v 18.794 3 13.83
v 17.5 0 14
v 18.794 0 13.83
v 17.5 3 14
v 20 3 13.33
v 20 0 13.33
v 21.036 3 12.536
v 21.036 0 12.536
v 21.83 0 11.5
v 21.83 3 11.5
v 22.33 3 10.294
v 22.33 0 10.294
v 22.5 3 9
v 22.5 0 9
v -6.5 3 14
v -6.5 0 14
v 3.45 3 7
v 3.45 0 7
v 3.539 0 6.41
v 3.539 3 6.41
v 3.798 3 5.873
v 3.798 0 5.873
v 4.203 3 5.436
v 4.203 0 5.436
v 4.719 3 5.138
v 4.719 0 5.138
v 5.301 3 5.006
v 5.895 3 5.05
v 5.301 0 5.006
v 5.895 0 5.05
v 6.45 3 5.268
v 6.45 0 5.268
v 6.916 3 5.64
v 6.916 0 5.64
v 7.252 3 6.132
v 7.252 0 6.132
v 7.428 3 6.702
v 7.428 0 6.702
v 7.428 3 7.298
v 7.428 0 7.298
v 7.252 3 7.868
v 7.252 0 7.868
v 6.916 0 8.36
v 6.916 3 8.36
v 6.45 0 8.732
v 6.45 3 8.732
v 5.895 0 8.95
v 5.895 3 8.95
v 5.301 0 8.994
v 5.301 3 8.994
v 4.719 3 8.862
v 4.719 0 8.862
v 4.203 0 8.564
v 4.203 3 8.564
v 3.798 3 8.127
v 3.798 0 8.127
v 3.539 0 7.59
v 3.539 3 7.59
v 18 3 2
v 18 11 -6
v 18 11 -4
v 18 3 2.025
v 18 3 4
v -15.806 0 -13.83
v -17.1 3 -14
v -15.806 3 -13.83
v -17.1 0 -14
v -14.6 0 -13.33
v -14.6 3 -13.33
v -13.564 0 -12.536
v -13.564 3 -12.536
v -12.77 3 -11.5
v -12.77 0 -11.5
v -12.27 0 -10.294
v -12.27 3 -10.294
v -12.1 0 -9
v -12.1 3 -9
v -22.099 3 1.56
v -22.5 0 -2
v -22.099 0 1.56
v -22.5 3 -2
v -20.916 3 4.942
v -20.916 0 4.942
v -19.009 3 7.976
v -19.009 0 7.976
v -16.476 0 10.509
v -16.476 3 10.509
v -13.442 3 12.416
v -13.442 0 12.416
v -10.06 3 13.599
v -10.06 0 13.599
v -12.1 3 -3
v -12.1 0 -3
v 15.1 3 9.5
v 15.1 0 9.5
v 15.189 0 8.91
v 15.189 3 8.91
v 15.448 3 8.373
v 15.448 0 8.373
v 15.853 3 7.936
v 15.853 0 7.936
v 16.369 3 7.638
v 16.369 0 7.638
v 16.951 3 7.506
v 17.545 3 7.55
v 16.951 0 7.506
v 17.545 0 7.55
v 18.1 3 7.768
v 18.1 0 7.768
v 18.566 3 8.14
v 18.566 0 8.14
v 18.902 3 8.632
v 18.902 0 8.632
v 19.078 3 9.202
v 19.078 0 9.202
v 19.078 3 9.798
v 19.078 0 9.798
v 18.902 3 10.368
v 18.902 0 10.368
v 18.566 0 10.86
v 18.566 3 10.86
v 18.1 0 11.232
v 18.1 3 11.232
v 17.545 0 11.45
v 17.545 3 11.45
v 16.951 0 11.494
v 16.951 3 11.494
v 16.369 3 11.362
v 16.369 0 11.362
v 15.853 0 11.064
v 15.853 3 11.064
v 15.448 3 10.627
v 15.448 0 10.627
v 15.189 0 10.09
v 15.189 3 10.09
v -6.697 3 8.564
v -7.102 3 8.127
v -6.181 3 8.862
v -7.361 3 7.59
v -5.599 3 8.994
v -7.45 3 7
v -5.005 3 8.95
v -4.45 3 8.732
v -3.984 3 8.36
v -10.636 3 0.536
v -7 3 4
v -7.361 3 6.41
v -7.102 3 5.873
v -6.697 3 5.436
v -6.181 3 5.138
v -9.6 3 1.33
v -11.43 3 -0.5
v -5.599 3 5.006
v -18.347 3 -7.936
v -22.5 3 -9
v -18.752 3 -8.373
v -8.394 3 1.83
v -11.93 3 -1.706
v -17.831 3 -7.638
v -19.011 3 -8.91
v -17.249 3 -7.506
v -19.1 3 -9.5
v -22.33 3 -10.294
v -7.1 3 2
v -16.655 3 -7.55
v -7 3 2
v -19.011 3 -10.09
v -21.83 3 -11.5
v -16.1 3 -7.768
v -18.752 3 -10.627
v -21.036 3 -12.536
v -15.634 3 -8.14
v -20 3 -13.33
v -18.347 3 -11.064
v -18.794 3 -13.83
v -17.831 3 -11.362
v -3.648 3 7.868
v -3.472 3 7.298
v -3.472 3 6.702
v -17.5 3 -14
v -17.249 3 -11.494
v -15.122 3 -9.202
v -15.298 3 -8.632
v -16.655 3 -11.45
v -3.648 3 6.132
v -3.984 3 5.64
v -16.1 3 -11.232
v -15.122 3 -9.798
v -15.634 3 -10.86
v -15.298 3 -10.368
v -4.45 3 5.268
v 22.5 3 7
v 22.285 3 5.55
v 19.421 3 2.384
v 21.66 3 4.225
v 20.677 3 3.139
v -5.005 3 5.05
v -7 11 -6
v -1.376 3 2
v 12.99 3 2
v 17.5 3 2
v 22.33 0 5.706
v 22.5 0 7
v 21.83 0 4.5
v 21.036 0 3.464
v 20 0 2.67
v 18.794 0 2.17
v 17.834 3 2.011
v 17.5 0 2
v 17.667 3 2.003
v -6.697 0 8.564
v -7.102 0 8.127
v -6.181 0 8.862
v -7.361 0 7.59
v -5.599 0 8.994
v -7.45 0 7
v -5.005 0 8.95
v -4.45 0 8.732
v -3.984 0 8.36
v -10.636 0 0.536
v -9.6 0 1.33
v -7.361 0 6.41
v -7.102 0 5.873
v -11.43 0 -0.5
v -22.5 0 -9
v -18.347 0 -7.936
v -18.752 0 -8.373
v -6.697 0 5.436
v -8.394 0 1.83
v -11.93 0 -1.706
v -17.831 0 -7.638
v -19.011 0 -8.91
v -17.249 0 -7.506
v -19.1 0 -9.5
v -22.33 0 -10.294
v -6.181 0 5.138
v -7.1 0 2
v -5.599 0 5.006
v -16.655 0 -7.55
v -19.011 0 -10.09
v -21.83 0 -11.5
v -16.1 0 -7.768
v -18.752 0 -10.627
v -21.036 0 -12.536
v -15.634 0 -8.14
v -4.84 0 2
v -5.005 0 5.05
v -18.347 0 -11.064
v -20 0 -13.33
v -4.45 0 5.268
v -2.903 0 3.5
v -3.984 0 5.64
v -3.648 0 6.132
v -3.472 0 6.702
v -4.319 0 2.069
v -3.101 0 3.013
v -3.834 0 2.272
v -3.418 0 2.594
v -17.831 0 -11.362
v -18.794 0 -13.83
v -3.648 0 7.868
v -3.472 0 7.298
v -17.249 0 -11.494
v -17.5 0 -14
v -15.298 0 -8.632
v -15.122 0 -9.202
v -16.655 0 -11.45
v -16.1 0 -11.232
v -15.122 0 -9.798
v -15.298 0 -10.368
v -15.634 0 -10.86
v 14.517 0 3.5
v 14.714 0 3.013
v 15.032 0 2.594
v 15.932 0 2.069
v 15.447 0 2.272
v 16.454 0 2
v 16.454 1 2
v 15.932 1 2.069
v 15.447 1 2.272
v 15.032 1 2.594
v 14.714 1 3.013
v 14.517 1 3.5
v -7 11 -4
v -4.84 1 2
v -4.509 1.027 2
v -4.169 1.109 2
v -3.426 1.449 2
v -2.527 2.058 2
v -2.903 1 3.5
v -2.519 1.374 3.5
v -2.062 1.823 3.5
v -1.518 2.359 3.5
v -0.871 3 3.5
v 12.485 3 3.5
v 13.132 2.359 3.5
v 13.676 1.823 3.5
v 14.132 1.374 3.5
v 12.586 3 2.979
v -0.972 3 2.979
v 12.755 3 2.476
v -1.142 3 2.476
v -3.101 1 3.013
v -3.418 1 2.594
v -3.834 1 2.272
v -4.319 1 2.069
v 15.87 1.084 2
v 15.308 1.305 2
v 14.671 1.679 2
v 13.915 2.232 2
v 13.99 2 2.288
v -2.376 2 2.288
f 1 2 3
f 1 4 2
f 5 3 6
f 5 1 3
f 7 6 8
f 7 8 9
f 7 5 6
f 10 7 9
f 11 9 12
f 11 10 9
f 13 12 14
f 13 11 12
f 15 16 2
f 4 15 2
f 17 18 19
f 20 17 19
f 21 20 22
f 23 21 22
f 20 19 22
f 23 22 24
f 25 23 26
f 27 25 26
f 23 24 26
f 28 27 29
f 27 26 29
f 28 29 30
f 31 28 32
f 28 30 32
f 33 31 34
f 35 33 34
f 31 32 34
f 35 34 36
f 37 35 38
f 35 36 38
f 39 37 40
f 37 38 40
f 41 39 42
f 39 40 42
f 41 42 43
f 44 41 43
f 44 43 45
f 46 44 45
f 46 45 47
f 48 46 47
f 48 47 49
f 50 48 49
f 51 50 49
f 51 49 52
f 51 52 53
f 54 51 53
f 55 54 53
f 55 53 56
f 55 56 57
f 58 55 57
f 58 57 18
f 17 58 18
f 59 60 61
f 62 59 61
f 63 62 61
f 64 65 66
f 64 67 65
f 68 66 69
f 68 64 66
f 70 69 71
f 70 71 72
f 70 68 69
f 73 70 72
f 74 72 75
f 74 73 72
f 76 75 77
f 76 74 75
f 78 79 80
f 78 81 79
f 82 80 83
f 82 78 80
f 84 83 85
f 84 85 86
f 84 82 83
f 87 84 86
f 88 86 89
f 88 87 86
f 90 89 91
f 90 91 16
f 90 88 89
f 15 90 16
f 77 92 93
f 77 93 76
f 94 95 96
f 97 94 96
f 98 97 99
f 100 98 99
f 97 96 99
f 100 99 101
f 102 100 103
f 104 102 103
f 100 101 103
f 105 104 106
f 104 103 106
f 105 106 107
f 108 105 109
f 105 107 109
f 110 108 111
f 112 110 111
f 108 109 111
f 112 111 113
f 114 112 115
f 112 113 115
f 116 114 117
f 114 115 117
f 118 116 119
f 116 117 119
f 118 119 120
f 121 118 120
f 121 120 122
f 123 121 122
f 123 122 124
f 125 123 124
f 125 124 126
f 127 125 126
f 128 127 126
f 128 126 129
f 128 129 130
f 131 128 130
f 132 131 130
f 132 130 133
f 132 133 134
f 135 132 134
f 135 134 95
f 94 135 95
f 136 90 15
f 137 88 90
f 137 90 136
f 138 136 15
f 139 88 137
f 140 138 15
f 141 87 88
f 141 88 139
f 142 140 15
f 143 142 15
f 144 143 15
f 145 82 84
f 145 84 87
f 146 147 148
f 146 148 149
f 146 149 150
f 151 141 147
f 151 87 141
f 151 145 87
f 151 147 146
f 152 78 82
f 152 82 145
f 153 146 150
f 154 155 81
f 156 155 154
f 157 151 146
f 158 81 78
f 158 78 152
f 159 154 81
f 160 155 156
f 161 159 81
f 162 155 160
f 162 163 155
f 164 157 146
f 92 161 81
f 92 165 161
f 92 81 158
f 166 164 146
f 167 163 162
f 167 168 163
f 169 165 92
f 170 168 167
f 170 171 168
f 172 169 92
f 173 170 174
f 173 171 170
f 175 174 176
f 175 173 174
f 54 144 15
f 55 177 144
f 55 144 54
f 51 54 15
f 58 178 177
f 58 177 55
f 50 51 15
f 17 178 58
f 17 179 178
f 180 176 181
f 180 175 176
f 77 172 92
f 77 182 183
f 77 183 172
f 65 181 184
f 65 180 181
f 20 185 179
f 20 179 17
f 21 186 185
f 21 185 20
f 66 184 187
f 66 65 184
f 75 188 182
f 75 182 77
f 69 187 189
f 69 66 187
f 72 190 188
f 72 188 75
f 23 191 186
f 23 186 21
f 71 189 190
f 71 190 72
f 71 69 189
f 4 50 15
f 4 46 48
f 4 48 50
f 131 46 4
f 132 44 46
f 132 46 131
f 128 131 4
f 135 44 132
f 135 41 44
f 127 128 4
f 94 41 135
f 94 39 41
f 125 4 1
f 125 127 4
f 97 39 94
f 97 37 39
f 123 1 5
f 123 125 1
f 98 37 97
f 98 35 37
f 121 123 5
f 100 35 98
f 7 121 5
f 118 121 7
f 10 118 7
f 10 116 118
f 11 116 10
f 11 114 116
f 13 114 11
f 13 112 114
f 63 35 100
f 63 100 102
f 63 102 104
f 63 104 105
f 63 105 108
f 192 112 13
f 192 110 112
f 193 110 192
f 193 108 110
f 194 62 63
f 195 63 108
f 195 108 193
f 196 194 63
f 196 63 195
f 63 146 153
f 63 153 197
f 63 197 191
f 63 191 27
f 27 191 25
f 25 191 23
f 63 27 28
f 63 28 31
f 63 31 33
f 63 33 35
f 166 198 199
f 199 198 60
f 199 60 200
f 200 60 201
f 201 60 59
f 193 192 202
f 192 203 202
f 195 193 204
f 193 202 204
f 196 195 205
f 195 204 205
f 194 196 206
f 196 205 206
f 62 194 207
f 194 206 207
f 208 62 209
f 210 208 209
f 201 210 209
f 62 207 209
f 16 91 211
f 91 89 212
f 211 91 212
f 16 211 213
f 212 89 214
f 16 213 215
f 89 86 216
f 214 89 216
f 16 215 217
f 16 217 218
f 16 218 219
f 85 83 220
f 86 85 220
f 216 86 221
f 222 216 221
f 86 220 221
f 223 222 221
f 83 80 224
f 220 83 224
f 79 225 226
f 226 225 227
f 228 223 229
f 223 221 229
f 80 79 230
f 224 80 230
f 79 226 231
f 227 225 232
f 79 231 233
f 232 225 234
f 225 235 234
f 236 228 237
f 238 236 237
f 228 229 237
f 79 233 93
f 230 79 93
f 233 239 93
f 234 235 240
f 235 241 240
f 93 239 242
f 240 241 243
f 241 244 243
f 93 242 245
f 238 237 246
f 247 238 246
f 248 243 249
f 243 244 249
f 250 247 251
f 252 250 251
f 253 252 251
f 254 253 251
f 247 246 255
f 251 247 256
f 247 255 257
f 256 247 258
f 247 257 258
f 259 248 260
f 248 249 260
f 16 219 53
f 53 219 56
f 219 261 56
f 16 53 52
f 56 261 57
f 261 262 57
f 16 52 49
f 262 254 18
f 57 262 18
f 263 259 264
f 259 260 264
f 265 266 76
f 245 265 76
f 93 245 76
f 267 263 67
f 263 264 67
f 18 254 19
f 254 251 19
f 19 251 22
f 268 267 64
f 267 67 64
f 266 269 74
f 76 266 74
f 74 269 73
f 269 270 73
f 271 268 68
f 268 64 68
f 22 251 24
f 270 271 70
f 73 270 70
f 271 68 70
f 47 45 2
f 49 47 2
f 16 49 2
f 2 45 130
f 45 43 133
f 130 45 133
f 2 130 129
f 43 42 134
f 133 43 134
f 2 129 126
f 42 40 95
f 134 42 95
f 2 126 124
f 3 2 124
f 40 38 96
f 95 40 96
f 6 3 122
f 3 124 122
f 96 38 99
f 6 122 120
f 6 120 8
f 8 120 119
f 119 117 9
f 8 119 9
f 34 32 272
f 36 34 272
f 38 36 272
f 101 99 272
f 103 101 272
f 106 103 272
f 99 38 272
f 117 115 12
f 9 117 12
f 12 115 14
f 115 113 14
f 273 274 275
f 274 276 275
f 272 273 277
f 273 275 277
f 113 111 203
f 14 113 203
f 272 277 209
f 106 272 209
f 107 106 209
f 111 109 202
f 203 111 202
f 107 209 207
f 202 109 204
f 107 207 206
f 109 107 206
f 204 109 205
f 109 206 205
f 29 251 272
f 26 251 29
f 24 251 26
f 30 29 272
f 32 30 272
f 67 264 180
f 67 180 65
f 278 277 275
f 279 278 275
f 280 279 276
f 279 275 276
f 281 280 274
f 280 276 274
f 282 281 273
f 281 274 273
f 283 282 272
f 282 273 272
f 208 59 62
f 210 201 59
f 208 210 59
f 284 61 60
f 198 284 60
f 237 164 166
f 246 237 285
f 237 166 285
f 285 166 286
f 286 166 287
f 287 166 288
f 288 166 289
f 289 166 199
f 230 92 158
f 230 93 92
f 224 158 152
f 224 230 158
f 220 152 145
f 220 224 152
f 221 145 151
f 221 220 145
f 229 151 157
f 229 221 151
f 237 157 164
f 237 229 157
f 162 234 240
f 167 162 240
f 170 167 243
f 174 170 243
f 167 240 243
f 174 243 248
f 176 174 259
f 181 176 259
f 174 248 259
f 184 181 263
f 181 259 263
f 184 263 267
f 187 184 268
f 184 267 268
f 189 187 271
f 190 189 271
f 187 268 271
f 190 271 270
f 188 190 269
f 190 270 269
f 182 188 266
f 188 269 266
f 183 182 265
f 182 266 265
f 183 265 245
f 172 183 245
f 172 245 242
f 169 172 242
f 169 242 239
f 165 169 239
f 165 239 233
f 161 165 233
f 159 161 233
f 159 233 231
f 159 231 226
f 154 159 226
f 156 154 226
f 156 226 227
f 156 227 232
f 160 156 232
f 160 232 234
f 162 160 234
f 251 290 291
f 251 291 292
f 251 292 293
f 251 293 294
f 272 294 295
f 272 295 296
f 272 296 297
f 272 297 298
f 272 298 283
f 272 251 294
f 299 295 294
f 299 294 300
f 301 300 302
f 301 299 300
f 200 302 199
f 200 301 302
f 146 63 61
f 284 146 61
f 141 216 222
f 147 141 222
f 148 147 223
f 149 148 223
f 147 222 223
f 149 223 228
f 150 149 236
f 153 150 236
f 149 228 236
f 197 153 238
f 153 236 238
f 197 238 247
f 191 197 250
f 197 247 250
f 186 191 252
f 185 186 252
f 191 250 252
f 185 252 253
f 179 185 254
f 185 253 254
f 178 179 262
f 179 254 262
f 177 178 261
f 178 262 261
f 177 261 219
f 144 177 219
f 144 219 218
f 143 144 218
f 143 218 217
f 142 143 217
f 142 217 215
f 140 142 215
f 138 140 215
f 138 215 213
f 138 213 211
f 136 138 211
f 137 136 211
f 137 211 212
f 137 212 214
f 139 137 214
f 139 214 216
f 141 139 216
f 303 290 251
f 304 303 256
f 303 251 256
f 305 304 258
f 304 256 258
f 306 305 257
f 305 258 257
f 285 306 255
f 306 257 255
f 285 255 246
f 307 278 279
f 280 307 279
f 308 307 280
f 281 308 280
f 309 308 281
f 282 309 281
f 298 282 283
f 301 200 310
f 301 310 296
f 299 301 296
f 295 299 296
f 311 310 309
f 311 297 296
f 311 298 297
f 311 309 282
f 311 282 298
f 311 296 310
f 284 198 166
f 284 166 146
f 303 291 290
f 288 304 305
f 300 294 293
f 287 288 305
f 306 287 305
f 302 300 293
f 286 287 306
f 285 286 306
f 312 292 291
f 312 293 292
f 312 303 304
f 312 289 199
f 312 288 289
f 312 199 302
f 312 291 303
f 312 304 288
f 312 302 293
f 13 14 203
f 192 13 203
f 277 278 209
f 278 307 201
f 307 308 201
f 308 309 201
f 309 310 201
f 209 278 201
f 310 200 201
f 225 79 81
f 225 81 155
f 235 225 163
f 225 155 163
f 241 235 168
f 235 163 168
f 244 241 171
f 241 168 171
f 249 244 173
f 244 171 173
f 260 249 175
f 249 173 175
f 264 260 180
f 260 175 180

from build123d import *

# Parameters (mm, degrees)
SKETCH1_W                = 45
SKETCH1_H                = 28
BOSS_EXTRUDE1_DEPTH      = 3
F_4_0_4_DIAMETER_HOLE1_D = 4
F_4_0_4_DIAMETER_HOLE2_D = 4
SKETCH10_W               = 34.6
SKETCH10_H               = 16
CUT_EXTRUDE2_DEPTH       = 3
FILLET2_R                = 5
FILLET3_R                = 16
BOSS_EXTRUDE2_START      = -5
BOSS_EXTRUDE2_DEPTH      = 25
SKETCH12_W               = 17.420537897
SKETCH12_H               = 1.5
CUT_EXTRUDE3_DEPTH       = 3
FILLET4_R                = 2
CHAMFER1_SIZE            = 2


with BuildPart() as part:
    # Sketch1 → Boss-Extrude1 (new body)
    with BuildSketch(Plane(origin=(0, 0, 0), x_dir=(1, 0, 0), z_dir=(0, 1, 0))):
        Rectangle(SKETCH1_W, SKETCH1_H)
    extrude(amount=BOSS_EXTRUDE1_DEPTH)

    # Ø4.0 (4) Diameter Hole1 (through all)
    with Locations(Plane(origin=(0, 3, 0), x_dir=(1, 0, 0), z_dir=(0, 1, 0))):
        with Locations((-17.1, 9.5), (17.1, -9.5)):
            Hole(F_4_0_4_DIAMETER_HOLE1_D / 2)

    # Ø4.0 (4) Diameter Hole2 (through all)
    with Locations(Plane(origin=(0, 3, 0), x_dir=(1, 0, 0), z_dir=(0, 1, 0))):
        with Locations((-5.45, -7), (5.45, -7)):
            Hole(F_4_0_4_DIAMETER_HOLE2_D / 2)

    # Sketch10 → Cut-Extrude2 (cut)
    with BuildSketch(Plane(origin=(0, 3, 0), x_dir=(1, 0, 0), z_dir=(0, 1, 0))):
        with Locations((5.2, 6)):
            Rectangle(SKETCH10_W, SKETCH10_H)
    extrude(amount=-CUT_EXTRUDE2_DEPTH, mode=Mode.SUBTRACT)

    # Fillet2
    fillet2_edges = [part.edges().sort_by_distance(p)[0] for p in [
        (-12.1, 1.5, -14),
        (22.5, 1.5, 2),
        (-12.1, 1.5, 2),
        (-22.5, 1.5, -14),
        (22.5, 1.5, 14),
    ]]
    fillet(fillet2_edges, radius=FILLET2_R)

    # Fillet3
    fillet3_edges = [part.edges().sort_by_distance(p)[0] for p in [
        (-22.5, 1.5, 14),
    ]]
    fillet(fillet3_edges, radius=FILLET3_R)

    # Sketch11 → Boss-Extrude2 (add)
    with BuildSketch(Plane(origin=(23, 0, 0), x_dir=(0, 0, -1), z_dir=(1, 0, 0)).offset(BOSS_EXTRUDE2_START)):
        Polygon((-4, 3), (4, 11), (6, 11), (-2, 3), align=None)
    extrude(amount=-BOSS_EXTRUDE2_DEPTH)

    # Sketch12 → Cut-Extrude3 (cut)
    with BuildSketch(Plane.XZ):
        with Locations((5.806845965, 2.75)):
            Rectangle(SKETCH12_W, SKETCH12_H)
    extrude(amount=-CUT_EXTRUDE3_DEPTH, mode=Mode.SUBTRACT)

    # Fillet4
    # the kernel refuses this fillet: 2 mm, written as the material it takes off along each edge
    with BuildSketch(Plane(origin=(-2.903422983, -4.841229183, 2), x_dir=(0, 0, 1), z_dir=(0, 1, 0))) as fillet4_piece_1:
        with BuildLine():
            CenterArc((2, -1.936491673), FILLET4_R, 104.477512186, 75.522487814)
            Line((0, -1.936491673), (0, 0))
            Line((0, 0), (1.5, 0))
        make_face()
    extrude(amount=7.841229183, mode=Mode.SUBTRACT)
    with BuildSketch(Plane(origin=(14.517114914, -4.841229183, 2), x_dir=(1, 0, 0), z_dir=(0, 1, 0))) as fillet4_piece_2:
        with BuildLine():
            CenterArc((1.936491673, -2), FILLET4_R, 90, 75.522487814)
            Line((0, -1.5), (0, 0))
            Line((0, 0), (1.936491673, 0))
        make_face()
    extrude(amount=7.841229183, mode=Mode.SUBTRACT)

    # Chamfer1
    # the kernel refuses this chamfer: 2 mm, written as the material it adds along each edge
    with BuildSketch(Plane(origin=(-4.839914656, 3, 4), x_dir=(-0.680858233566239, 0, 0.732415227712437), z_dir=(-0.732415227712437, 0, -0.680858233566239))) as chamfer1_piece_1_section:
        Polygon((2, -CHAMFER1_SIZE), (2 + CHAMFER1_SIZE, 0), (2, 0), align=None)
    chamfer1_piece_1 = revolve(axis=Axis((-4.839914656, 3, 4), (0, 1, 0)), revolution_arc=222.910744897, mode=Mode.PRIVATE)
    chamfer1_piece_1 = split(chamfer1_piece_1, bisect_by=Plane(origin=(-2.32351346, 2.593002324, 2), z_dir=(0, 0, 1)), keep=Keep.TOP, mode=Mode.PRIVATE)
    chamfer1_piece_1 = split(chamfer1_piece_1, bisect_by=Plane(origin=(-2.32351346, 2.593002324, 3.5), z_dir=(0, 0, -1)), keep=Keep.TOP, mode=Mode.PRIVATE)
    add(chamfer1_piece_1)
    with BuildSketch(Plane(origin=(16.453606588, 3, 4), x_dir=(0, 0, -1), z_dir=(1, 0, 0))) as chamfer1_piece_2_section:
        Polygon((2, -CHAMFER1_SIZE), (2 + CHAMFER1_SIZE, 0), (2, 0), align=None)
    chamfer1_piece_2 = revolve(axis=Axis((16.453606588, 3, 4), (0, 1, 0)), revolution_arc=222.910744897, mode=Mode.PRIVATE)
    chamfer1_piece_2 = split(chamfer1_piece_2, bisect_by=Plane(origin=(14.636969069, 2.019912547, 2), z_dir=(0, 0, 1)), keep=Keep.TOP, mode=Mode.PRIVATE)
    chamfer1_piece_2 = split(chamfer1_piece_2, bisect_by=Plane(origin=(14.636969069, 3.296842404, 3.703157596), z_dir=(0, -0.7071067811865511, -0.7071067811865439)), keep=Keep.TOP, mode=Mode.PRIVATE)
    add(chamfer1_piece_2)


solid = part.part
